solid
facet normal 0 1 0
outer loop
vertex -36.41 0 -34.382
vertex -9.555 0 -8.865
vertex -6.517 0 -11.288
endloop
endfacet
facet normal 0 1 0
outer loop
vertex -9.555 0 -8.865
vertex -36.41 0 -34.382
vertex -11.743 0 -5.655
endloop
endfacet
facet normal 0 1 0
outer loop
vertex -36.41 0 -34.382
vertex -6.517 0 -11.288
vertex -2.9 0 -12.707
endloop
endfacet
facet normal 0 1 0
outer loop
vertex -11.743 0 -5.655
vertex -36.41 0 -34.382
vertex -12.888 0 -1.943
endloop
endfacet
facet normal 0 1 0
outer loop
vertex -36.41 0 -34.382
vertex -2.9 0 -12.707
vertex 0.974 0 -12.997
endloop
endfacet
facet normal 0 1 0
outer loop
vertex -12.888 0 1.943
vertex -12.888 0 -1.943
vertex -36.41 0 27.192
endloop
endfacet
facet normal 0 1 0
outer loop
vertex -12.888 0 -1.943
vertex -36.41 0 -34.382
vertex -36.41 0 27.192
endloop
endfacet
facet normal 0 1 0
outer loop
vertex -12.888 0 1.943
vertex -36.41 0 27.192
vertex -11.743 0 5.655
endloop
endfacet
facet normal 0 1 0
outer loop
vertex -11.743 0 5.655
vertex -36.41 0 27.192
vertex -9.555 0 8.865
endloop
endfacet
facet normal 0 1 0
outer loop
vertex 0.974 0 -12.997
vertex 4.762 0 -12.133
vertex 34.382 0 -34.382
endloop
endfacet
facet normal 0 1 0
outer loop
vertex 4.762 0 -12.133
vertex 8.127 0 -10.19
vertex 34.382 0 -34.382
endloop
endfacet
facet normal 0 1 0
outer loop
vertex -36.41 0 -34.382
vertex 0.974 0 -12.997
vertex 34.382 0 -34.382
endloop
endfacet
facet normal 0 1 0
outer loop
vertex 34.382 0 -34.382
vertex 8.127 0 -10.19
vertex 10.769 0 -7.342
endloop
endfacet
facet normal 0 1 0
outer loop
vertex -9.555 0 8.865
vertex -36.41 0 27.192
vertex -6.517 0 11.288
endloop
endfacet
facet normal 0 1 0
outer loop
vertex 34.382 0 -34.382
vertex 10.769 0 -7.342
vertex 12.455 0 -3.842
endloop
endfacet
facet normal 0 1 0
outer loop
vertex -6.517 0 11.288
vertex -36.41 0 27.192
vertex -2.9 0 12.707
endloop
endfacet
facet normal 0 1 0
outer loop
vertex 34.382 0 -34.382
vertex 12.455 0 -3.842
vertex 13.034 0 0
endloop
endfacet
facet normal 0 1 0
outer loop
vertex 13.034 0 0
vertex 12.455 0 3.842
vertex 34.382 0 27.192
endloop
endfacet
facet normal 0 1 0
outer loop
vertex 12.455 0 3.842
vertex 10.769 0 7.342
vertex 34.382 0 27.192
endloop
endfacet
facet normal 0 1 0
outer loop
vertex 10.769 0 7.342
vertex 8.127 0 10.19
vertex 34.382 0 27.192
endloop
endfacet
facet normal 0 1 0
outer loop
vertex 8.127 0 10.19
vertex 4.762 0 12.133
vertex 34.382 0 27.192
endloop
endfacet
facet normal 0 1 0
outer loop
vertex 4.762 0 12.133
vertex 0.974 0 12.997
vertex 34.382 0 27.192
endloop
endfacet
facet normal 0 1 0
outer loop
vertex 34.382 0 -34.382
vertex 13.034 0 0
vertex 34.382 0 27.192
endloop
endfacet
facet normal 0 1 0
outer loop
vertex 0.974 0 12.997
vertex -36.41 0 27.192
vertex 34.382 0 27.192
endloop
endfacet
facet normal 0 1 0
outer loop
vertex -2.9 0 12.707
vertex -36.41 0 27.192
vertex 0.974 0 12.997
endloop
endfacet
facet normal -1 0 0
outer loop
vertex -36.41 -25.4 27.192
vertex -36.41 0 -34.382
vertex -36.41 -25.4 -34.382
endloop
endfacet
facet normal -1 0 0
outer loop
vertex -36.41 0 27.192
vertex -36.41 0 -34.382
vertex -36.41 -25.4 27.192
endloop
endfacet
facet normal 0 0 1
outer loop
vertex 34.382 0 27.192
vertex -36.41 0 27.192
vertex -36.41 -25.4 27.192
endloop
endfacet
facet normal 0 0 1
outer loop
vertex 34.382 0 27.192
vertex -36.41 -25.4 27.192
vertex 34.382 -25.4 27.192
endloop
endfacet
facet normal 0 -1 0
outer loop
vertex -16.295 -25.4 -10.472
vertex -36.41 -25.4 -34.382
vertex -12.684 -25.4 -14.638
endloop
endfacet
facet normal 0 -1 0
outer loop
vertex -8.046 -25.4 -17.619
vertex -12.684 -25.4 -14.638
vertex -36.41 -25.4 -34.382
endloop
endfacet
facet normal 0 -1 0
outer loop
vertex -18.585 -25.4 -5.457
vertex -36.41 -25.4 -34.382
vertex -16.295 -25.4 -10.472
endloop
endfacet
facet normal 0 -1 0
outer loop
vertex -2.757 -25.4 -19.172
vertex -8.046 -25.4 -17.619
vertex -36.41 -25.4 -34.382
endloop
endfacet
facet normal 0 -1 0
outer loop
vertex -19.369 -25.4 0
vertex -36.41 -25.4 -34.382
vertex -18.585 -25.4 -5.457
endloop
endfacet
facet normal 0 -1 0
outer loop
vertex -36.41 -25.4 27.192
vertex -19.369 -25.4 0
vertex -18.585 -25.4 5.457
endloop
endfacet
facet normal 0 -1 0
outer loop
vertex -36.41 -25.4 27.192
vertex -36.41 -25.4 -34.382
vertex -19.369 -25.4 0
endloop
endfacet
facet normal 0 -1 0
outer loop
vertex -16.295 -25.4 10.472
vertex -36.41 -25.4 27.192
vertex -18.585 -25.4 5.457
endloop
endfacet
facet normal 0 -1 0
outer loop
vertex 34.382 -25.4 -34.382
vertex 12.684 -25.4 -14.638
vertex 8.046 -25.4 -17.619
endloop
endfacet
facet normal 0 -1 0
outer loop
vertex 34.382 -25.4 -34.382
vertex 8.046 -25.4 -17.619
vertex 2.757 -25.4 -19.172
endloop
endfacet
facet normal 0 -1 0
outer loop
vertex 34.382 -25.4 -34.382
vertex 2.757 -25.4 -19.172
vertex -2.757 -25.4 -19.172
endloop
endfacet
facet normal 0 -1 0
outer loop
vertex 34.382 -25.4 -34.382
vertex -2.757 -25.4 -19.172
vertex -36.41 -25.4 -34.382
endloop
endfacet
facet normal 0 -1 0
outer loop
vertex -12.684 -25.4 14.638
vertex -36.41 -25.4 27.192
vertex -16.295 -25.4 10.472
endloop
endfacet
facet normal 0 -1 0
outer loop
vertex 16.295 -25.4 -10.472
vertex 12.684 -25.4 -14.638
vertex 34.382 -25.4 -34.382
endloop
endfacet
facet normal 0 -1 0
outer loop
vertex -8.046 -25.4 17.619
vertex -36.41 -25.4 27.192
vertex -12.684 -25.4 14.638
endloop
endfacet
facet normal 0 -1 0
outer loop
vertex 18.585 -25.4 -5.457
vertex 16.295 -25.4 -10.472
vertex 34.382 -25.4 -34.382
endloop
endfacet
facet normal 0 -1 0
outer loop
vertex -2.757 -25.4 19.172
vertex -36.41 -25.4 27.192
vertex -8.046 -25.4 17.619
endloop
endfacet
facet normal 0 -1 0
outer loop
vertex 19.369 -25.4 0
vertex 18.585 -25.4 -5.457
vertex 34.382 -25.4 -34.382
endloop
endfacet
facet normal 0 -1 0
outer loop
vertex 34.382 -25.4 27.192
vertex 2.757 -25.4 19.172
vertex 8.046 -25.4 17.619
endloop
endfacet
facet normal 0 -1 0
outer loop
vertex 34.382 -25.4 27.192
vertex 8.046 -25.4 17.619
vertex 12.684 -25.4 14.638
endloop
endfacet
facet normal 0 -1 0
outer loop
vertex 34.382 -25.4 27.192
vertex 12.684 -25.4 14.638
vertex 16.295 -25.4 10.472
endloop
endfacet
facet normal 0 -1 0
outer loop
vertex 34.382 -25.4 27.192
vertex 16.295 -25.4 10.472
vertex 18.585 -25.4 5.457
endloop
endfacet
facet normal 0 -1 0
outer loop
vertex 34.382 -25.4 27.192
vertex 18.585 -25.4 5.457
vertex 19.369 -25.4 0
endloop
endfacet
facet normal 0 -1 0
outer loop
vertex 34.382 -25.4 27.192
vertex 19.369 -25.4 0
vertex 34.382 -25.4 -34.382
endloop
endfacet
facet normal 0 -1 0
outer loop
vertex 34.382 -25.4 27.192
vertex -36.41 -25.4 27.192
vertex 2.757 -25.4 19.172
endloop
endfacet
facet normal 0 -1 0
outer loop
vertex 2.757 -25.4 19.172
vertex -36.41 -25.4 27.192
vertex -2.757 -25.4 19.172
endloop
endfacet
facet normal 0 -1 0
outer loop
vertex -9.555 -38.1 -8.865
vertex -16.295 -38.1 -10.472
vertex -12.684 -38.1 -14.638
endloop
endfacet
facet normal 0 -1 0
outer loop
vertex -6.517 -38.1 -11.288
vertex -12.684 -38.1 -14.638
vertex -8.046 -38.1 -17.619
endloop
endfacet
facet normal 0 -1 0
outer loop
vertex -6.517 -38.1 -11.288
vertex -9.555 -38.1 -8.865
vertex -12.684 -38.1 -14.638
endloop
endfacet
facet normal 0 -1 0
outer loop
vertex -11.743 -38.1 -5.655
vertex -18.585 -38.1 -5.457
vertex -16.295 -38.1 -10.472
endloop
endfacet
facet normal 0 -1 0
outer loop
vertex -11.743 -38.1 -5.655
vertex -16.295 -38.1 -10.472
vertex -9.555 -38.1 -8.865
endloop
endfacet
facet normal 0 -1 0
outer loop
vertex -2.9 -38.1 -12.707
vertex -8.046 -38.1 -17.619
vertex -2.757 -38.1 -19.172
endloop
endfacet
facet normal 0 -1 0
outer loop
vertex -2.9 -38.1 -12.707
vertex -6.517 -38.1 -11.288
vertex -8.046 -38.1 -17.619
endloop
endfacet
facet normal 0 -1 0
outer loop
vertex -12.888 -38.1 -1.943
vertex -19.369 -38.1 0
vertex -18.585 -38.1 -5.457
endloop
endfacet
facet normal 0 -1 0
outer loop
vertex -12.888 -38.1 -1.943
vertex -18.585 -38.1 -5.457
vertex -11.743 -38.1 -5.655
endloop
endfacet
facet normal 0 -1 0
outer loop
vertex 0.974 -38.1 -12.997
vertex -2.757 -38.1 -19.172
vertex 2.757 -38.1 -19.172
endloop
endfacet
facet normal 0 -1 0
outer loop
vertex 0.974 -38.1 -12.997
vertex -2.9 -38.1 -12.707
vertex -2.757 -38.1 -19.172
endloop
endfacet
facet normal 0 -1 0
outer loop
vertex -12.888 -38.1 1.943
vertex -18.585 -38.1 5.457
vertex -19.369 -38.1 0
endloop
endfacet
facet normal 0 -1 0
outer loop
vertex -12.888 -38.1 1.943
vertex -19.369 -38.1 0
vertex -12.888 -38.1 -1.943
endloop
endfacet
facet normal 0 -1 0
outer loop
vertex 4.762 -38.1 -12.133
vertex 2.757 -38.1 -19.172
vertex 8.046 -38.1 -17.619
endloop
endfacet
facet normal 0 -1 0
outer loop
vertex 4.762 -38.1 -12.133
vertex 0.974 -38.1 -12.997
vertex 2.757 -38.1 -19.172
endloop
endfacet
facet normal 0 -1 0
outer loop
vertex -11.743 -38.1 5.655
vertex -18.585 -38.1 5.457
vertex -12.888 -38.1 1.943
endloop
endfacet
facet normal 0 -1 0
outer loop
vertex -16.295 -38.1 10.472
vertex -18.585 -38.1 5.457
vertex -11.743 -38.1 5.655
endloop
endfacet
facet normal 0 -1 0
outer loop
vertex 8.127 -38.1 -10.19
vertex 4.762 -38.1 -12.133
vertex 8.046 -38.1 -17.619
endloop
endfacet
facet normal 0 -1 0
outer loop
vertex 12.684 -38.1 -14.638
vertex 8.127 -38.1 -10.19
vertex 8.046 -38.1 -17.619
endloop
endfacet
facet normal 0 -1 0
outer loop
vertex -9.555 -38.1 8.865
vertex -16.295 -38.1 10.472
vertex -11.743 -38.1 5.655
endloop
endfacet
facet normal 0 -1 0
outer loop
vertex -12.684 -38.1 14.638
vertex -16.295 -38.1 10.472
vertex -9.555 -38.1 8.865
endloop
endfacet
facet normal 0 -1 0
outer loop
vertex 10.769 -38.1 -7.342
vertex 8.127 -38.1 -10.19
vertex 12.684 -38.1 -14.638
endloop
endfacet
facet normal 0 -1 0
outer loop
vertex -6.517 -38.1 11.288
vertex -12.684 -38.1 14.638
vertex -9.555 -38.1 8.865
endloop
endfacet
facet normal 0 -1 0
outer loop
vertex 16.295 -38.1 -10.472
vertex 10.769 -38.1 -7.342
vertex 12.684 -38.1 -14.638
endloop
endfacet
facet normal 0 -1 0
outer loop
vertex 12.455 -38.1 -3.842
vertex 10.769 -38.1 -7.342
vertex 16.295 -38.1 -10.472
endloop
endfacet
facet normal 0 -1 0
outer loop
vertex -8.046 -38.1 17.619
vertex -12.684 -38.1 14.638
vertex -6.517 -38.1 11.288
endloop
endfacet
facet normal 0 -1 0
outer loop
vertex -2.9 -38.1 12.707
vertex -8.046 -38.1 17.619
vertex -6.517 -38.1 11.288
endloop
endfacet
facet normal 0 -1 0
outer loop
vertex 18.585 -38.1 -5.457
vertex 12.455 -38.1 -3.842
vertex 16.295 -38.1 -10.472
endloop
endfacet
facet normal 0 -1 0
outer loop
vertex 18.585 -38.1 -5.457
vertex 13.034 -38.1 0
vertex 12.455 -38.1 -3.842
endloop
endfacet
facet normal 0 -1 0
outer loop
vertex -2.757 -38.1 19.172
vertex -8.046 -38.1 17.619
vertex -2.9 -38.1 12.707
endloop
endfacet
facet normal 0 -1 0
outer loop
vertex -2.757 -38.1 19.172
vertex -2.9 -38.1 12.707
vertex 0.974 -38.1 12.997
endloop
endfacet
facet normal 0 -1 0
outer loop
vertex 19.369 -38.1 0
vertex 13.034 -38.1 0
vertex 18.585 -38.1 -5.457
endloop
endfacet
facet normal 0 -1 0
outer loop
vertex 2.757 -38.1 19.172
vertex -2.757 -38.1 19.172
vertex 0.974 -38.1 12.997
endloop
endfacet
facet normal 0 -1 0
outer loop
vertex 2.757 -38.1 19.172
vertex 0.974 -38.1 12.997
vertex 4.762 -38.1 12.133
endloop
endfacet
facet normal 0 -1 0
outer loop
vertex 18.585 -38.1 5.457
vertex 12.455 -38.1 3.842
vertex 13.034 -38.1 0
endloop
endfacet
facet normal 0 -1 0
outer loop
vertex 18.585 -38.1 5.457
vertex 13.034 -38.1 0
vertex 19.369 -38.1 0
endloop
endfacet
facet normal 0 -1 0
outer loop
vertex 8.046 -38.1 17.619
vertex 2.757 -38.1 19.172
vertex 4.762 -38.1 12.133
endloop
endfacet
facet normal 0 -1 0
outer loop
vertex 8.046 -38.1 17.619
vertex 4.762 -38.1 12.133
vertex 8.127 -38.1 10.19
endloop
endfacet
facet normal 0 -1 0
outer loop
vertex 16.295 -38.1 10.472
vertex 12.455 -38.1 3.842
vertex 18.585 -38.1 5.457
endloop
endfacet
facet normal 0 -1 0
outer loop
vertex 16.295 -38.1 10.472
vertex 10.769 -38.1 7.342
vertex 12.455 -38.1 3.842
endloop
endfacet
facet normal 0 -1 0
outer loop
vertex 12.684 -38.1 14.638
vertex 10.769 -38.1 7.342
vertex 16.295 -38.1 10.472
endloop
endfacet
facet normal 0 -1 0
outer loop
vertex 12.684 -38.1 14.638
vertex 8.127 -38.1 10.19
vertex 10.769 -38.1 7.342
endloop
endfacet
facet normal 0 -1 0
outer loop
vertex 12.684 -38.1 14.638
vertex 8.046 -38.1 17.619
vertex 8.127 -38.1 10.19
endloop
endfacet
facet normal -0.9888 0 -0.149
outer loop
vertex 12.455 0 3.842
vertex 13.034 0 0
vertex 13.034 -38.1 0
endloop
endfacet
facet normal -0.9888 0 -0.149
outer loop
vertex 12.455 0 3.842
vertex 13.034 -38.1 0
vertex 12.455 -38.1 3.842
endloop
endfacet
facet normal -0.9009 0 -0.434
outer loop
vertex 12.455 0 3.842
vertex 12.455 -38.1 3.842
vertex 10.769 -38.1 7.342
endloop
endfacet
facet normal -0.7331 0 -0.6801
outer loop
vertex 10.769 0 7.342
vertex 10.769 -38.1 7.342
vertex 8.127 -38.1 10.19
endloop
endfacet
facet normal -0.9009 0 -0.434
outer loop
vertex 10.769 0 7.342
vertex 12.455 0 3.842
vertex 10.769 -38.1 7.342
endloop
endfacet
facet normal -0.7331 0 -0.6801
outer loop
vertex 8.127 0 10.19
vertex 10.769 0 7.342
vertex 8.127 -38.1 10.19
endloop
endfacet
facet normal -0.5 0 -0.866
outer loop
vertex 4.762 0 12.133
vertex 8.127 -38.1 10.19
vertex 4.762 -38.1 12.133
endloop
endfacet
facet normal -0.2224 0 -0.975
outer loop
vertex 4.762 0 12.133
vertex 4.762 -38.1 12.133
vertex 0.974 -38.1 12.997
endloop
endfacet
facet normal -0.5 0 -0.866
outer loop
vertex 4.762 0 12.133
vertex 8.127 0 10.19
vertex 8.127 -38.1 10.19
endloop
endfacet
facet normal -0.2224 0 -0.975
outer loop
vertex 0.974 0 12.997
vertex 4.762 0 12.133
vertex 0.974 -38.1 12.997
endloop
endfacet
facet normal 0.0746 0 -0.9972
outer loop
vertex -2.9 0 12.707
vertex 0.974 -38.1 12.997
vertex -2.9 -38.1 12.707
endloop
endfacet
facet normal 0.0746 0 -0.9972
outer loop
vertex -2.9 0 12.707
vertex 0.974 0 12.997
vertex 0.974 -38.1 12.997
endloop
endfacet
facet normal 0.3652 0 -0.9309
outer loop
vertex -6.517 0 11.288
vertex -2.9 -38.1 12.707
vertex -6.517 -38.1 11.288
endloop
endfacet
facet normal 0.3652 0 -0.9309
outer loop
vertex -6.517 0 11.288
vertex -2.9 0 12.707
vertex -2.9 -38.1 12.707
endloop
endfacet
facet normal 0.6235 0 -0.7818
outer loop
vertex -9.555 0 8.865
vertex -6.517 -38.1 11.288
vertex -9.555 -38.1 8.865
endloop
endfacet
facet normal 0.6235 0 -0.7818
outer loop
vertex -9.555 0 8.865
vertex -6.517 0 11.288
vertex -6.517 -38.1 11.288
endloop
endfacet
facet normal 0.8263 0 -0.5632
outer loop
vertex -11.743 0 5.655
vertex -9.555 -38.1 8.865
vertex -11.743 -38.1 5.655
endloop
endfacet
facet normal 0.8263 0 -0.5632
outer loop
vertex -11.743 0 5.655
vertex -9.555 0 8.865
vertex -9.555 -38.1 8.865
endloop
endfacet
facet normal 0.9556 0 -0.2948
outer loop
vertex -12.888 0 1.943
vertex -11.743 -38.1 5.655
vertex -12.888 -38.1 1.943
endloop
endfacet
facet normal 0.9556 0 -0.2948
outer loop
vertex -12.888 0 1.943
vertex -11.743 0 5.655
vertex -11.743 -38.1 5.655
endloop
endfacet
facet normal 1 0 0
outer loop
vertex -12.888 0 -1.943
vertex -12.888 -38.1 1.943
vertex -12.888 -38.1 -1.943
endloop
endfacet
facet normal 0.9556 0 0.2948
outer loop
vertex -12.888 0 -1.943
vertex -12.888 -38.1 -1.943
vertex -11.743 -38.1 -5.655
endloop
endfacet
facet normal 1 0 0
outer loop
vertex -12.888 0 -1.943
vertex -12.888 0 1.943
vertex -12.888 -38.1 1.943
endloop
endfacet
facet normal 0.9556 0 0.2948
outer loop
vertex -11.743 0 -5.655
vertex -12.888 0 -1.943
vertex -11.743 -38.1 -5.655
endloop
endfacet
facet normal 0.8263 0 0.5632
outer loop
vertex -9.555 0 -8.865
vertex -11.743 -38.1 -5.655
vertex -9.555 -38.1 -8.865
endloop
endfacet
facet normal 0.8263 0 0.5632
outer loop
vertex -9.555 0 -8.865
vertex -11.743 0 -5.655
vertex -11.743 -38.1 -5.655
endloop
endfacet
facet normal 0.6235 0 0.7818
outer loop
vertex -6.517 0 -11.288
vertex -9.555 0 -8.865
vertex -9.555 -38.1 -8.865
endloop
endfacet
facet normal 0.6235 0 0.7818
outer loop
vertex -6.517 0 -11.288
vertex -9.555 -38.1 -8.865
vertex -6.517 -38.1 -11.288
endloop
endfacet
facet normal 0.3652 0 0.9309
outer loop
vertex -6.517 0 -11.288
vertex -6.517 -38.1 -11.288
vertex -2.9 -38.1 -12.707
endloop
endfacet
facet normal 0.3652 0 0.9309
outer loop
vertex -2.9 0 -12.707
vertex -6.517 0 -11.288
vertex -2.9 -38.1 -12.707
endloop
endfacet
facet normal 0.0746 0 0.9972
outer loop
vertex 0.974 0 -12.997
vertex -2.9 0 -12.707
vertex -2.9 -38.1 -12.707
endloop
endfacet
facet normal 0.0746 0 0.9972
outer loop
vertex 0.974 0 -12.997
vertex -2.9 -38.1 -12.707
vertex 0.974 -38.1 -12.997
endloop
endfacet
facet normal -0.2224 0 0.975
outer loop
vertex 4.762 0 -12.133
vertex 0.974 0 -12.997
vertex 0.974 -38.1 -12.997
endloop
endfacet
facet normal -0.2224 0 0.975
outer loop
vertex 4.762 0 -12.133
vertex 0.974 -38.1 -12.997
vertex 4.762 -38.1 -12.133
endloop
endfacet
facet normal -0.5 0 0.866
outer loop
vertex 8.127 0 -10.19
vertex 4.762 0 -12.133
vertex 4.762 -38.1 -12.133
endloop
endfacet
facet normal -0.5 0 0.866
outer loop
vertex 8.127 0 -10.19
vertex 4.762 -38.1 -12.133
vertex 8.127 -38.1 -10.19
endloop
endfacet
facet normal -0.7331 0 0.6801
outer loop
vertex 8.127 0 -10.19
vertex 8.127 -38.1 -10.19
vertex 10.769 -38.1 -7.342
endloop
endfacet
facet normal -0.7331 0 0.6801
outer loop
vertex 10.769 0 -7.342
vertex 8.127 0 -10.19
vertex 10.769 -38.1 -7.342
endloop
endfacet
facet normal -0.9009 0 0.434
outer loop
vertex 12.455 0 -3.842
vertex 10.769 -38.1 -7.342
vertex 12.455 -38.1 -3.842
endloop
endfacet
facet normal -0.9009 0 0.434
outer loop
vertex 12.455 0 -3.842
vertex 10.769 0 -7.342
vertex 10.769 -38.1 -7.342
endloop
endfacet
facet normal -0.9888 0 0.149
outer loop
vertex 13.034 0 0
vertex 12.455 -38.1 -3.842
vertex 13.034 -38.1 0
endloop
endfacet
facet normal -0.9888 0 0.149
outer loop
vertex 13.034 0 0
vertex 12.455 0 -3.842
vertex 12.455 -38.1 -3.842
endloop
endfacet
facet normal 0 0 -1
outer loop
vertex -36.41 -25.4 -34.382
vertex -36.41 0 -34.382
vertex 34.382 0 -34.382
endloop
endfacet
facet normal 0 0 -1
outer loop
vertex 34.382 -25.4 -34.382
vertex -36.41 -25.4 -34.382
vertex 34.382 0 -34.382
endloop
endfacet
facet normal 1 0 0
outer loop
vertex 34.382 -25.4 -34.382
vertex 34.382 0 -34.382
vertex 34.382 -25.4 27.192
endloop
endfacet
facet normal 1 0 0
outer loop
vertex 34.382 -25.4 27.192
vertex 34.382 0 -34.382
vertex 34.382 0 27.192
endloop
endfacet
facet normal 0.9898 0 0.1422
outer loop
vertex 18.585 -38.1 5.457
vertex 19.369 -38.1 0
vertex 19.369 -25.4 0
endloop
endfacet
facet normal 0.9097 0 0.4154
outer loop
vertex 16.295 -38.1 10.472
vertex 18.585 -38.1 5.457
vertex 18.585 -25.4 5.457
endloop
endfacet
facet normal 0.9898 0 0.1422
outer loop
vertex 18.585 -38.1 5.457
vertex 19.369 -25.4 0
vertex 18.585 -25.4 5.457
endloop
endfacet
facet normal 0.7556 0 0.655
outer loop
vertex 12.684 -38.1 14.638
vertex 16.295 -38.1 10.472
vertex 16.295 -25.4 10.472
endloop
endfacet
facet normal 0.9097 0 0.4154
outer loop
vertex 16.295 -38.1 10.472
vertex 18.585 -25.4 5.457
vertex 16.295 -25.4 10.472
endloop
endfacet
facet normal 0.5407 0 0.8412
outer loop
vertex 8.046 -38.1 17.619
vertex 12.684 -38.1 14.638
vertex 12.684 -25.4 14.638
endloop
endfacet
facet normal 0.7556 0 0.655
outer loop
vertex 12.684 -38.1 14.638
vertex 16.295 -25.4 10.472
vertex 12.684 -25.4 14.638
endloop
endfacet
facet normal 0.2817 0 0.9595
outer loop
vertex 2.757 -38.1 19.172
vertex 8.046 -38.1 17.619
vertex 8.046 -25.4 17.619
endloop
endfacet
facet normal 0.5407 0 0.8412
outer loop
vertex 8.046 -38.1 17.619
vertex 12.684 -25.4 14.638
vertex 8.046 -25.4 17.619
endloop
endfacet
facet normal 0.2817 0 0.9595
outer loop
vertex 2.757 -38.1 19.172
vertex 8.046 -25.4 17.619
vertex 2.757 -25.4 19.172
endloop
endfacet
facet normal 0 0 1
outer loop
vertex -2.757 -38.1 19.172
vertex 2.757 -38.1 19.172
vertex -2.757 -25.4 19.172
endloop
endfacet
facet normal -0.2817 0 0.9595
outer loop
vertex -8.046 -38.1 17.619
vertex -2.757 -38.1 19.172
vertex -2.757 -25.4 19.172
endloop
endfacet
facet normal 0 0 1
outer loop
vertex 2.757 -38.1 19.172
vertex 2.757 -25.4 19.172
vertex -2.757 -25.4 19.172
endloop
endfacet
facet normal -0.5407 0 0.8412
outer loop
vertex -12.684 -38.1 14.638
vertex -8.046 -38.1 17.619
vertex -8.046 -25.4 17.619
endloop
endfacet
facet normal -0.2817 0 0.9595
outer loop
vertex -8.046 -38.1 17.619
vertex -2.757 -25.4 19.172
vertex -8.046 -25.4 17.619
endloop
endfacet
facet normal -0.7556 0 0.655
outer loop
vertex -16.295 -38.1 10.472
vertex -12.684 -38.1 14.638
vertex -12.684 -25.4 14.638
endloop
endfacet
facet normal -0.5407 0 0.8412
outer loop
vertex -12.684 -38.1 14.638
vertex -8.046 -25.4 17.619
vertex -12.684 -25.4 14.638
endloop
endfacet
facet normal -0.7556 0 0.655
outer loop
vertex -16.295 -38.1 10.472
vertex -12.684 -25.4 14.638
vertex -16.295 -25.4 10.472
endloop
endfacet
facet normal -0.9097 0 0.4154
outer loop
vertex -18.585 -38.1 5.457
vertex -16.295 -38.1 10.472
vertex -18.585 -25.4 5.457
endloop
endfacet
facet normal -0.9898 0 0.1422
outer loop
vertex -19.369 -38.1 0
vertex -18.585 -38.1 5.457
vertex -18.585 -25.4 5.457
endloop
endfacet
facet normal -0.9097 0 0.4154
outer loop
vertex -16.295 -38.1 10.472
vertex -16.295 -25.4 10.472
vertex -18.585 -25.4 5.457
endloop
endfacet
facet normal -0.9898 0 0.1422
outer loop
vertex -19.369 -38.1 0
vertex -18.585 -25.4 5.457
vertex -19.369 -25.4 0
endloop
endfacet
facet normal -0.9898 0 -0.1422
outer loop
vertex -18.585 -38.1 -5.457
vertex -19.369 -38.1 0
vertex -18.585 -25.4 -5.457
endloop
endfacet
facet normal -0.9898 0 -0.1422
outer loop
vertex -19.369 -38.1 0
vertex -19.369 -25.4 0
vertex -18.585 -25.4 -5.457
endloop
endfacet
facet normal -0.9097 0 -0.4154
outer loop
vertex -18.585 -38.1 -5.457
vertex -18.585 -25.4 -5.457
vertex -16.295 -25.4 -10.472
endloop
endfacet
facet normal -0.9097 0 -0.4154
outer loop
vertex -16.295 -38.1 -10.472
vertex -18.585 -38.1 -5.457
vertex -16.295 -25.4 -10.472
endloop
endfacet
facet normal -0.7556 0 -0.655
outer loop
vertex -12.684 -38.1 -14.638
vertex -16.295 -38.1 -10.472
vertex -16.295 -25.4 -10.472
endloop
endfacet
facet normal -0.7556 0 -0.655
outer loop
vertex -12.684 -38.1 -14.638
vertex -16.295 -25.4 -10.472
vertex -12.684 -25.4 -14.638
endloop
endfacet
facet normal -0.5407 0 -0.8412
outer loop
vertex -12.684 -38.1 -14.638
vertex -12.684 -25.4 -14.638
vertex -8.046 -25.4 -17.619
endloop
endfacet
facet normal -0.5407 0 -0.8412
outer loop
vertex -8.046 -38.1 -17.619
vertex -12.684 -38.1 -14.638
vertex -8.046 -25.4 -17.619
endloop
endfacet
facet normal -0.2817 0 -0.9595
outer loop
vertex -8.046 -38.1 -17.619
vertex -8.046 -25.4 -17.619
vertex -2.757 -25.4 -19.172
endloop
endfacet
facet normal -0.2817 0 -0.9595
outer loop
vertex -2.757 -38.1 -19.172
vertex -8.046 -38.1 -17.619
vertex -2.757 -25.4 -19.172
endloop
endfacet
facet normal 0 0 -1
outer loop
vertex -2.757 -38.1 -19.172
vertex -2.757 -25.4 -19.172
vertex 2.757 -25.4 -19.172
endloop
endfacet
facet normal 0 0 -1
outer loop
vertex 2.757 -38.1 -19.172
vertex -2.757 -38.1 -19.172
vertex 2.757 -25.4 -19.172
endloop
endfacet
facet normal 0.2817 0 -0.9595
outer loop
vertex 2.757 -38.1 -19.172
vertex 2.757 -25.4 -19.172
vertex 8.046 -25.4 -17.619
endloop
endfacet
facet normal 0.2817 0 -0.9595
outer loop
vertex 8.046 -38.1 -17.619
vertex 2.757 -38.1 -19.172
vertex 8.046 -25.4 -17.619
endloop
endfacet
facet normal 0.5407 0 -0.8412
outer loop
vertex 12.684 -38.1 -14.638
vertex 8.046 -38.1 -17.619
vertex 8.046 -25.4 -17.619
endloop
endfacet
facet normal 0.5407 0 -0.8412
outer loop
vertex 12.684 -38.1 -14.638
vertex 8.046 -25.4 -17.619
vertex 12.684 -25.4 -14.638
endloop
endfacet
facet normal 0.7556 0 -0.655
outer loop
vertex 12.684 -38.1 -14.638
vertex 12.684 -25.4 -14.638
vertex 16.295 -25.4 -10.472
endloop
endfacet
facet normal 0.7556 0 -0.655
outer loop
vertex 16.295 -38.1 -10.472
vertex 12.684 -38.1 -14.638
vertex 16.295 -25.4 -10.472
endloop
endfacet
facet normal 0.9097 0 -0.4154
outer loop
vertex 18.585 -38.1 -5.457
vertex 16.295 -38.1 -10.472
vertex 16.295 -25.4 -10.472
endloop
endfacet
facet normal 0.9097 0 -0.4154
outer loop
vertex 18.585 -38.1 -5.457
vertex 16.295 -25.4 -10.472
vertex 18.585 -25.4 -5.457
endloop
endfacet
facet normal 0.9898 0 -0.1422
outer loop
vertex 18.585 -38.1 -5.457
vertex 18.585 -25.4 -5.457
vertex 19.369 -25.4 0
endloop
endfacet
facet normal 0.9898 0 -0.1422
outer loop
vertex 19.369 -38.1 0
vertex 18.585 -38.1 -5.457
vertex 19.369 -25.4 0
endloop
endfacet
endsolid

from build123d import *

# Parameters (mm, degrees)
F0_W     = 70.792261
F0_H     = 61.574518
F1_DEPTH = 25.4
F2_R     = 19.369368
F3_DEPTH = 38.1
F4_R     = 13.0339
F5_DEPTH = 38.1


with BuildPart() as f1:
    # F0 (on Front) → F1 (new body)
    with BuildSketch(Plane.XZ):
        with Locations((-1.013951, -3.59492)):
            Rectangle(F0_W, F0_H)
    extrude(amount=F1_DEPTH)

    # F2 (on Front) → F3 (join)
    with BuildSketch(Plane.XZ):
        Circle(F2_R)
    extrude(amount=F3_DEPTH)

    # F4 (on Front) → F5 (cut)
    with BuildSketch(Plane.XZ):
        Circle(F4_R)
    extrude(amount=F5_DEPTH, mode=Mode.SUBTRACT)


solid = f1.part
